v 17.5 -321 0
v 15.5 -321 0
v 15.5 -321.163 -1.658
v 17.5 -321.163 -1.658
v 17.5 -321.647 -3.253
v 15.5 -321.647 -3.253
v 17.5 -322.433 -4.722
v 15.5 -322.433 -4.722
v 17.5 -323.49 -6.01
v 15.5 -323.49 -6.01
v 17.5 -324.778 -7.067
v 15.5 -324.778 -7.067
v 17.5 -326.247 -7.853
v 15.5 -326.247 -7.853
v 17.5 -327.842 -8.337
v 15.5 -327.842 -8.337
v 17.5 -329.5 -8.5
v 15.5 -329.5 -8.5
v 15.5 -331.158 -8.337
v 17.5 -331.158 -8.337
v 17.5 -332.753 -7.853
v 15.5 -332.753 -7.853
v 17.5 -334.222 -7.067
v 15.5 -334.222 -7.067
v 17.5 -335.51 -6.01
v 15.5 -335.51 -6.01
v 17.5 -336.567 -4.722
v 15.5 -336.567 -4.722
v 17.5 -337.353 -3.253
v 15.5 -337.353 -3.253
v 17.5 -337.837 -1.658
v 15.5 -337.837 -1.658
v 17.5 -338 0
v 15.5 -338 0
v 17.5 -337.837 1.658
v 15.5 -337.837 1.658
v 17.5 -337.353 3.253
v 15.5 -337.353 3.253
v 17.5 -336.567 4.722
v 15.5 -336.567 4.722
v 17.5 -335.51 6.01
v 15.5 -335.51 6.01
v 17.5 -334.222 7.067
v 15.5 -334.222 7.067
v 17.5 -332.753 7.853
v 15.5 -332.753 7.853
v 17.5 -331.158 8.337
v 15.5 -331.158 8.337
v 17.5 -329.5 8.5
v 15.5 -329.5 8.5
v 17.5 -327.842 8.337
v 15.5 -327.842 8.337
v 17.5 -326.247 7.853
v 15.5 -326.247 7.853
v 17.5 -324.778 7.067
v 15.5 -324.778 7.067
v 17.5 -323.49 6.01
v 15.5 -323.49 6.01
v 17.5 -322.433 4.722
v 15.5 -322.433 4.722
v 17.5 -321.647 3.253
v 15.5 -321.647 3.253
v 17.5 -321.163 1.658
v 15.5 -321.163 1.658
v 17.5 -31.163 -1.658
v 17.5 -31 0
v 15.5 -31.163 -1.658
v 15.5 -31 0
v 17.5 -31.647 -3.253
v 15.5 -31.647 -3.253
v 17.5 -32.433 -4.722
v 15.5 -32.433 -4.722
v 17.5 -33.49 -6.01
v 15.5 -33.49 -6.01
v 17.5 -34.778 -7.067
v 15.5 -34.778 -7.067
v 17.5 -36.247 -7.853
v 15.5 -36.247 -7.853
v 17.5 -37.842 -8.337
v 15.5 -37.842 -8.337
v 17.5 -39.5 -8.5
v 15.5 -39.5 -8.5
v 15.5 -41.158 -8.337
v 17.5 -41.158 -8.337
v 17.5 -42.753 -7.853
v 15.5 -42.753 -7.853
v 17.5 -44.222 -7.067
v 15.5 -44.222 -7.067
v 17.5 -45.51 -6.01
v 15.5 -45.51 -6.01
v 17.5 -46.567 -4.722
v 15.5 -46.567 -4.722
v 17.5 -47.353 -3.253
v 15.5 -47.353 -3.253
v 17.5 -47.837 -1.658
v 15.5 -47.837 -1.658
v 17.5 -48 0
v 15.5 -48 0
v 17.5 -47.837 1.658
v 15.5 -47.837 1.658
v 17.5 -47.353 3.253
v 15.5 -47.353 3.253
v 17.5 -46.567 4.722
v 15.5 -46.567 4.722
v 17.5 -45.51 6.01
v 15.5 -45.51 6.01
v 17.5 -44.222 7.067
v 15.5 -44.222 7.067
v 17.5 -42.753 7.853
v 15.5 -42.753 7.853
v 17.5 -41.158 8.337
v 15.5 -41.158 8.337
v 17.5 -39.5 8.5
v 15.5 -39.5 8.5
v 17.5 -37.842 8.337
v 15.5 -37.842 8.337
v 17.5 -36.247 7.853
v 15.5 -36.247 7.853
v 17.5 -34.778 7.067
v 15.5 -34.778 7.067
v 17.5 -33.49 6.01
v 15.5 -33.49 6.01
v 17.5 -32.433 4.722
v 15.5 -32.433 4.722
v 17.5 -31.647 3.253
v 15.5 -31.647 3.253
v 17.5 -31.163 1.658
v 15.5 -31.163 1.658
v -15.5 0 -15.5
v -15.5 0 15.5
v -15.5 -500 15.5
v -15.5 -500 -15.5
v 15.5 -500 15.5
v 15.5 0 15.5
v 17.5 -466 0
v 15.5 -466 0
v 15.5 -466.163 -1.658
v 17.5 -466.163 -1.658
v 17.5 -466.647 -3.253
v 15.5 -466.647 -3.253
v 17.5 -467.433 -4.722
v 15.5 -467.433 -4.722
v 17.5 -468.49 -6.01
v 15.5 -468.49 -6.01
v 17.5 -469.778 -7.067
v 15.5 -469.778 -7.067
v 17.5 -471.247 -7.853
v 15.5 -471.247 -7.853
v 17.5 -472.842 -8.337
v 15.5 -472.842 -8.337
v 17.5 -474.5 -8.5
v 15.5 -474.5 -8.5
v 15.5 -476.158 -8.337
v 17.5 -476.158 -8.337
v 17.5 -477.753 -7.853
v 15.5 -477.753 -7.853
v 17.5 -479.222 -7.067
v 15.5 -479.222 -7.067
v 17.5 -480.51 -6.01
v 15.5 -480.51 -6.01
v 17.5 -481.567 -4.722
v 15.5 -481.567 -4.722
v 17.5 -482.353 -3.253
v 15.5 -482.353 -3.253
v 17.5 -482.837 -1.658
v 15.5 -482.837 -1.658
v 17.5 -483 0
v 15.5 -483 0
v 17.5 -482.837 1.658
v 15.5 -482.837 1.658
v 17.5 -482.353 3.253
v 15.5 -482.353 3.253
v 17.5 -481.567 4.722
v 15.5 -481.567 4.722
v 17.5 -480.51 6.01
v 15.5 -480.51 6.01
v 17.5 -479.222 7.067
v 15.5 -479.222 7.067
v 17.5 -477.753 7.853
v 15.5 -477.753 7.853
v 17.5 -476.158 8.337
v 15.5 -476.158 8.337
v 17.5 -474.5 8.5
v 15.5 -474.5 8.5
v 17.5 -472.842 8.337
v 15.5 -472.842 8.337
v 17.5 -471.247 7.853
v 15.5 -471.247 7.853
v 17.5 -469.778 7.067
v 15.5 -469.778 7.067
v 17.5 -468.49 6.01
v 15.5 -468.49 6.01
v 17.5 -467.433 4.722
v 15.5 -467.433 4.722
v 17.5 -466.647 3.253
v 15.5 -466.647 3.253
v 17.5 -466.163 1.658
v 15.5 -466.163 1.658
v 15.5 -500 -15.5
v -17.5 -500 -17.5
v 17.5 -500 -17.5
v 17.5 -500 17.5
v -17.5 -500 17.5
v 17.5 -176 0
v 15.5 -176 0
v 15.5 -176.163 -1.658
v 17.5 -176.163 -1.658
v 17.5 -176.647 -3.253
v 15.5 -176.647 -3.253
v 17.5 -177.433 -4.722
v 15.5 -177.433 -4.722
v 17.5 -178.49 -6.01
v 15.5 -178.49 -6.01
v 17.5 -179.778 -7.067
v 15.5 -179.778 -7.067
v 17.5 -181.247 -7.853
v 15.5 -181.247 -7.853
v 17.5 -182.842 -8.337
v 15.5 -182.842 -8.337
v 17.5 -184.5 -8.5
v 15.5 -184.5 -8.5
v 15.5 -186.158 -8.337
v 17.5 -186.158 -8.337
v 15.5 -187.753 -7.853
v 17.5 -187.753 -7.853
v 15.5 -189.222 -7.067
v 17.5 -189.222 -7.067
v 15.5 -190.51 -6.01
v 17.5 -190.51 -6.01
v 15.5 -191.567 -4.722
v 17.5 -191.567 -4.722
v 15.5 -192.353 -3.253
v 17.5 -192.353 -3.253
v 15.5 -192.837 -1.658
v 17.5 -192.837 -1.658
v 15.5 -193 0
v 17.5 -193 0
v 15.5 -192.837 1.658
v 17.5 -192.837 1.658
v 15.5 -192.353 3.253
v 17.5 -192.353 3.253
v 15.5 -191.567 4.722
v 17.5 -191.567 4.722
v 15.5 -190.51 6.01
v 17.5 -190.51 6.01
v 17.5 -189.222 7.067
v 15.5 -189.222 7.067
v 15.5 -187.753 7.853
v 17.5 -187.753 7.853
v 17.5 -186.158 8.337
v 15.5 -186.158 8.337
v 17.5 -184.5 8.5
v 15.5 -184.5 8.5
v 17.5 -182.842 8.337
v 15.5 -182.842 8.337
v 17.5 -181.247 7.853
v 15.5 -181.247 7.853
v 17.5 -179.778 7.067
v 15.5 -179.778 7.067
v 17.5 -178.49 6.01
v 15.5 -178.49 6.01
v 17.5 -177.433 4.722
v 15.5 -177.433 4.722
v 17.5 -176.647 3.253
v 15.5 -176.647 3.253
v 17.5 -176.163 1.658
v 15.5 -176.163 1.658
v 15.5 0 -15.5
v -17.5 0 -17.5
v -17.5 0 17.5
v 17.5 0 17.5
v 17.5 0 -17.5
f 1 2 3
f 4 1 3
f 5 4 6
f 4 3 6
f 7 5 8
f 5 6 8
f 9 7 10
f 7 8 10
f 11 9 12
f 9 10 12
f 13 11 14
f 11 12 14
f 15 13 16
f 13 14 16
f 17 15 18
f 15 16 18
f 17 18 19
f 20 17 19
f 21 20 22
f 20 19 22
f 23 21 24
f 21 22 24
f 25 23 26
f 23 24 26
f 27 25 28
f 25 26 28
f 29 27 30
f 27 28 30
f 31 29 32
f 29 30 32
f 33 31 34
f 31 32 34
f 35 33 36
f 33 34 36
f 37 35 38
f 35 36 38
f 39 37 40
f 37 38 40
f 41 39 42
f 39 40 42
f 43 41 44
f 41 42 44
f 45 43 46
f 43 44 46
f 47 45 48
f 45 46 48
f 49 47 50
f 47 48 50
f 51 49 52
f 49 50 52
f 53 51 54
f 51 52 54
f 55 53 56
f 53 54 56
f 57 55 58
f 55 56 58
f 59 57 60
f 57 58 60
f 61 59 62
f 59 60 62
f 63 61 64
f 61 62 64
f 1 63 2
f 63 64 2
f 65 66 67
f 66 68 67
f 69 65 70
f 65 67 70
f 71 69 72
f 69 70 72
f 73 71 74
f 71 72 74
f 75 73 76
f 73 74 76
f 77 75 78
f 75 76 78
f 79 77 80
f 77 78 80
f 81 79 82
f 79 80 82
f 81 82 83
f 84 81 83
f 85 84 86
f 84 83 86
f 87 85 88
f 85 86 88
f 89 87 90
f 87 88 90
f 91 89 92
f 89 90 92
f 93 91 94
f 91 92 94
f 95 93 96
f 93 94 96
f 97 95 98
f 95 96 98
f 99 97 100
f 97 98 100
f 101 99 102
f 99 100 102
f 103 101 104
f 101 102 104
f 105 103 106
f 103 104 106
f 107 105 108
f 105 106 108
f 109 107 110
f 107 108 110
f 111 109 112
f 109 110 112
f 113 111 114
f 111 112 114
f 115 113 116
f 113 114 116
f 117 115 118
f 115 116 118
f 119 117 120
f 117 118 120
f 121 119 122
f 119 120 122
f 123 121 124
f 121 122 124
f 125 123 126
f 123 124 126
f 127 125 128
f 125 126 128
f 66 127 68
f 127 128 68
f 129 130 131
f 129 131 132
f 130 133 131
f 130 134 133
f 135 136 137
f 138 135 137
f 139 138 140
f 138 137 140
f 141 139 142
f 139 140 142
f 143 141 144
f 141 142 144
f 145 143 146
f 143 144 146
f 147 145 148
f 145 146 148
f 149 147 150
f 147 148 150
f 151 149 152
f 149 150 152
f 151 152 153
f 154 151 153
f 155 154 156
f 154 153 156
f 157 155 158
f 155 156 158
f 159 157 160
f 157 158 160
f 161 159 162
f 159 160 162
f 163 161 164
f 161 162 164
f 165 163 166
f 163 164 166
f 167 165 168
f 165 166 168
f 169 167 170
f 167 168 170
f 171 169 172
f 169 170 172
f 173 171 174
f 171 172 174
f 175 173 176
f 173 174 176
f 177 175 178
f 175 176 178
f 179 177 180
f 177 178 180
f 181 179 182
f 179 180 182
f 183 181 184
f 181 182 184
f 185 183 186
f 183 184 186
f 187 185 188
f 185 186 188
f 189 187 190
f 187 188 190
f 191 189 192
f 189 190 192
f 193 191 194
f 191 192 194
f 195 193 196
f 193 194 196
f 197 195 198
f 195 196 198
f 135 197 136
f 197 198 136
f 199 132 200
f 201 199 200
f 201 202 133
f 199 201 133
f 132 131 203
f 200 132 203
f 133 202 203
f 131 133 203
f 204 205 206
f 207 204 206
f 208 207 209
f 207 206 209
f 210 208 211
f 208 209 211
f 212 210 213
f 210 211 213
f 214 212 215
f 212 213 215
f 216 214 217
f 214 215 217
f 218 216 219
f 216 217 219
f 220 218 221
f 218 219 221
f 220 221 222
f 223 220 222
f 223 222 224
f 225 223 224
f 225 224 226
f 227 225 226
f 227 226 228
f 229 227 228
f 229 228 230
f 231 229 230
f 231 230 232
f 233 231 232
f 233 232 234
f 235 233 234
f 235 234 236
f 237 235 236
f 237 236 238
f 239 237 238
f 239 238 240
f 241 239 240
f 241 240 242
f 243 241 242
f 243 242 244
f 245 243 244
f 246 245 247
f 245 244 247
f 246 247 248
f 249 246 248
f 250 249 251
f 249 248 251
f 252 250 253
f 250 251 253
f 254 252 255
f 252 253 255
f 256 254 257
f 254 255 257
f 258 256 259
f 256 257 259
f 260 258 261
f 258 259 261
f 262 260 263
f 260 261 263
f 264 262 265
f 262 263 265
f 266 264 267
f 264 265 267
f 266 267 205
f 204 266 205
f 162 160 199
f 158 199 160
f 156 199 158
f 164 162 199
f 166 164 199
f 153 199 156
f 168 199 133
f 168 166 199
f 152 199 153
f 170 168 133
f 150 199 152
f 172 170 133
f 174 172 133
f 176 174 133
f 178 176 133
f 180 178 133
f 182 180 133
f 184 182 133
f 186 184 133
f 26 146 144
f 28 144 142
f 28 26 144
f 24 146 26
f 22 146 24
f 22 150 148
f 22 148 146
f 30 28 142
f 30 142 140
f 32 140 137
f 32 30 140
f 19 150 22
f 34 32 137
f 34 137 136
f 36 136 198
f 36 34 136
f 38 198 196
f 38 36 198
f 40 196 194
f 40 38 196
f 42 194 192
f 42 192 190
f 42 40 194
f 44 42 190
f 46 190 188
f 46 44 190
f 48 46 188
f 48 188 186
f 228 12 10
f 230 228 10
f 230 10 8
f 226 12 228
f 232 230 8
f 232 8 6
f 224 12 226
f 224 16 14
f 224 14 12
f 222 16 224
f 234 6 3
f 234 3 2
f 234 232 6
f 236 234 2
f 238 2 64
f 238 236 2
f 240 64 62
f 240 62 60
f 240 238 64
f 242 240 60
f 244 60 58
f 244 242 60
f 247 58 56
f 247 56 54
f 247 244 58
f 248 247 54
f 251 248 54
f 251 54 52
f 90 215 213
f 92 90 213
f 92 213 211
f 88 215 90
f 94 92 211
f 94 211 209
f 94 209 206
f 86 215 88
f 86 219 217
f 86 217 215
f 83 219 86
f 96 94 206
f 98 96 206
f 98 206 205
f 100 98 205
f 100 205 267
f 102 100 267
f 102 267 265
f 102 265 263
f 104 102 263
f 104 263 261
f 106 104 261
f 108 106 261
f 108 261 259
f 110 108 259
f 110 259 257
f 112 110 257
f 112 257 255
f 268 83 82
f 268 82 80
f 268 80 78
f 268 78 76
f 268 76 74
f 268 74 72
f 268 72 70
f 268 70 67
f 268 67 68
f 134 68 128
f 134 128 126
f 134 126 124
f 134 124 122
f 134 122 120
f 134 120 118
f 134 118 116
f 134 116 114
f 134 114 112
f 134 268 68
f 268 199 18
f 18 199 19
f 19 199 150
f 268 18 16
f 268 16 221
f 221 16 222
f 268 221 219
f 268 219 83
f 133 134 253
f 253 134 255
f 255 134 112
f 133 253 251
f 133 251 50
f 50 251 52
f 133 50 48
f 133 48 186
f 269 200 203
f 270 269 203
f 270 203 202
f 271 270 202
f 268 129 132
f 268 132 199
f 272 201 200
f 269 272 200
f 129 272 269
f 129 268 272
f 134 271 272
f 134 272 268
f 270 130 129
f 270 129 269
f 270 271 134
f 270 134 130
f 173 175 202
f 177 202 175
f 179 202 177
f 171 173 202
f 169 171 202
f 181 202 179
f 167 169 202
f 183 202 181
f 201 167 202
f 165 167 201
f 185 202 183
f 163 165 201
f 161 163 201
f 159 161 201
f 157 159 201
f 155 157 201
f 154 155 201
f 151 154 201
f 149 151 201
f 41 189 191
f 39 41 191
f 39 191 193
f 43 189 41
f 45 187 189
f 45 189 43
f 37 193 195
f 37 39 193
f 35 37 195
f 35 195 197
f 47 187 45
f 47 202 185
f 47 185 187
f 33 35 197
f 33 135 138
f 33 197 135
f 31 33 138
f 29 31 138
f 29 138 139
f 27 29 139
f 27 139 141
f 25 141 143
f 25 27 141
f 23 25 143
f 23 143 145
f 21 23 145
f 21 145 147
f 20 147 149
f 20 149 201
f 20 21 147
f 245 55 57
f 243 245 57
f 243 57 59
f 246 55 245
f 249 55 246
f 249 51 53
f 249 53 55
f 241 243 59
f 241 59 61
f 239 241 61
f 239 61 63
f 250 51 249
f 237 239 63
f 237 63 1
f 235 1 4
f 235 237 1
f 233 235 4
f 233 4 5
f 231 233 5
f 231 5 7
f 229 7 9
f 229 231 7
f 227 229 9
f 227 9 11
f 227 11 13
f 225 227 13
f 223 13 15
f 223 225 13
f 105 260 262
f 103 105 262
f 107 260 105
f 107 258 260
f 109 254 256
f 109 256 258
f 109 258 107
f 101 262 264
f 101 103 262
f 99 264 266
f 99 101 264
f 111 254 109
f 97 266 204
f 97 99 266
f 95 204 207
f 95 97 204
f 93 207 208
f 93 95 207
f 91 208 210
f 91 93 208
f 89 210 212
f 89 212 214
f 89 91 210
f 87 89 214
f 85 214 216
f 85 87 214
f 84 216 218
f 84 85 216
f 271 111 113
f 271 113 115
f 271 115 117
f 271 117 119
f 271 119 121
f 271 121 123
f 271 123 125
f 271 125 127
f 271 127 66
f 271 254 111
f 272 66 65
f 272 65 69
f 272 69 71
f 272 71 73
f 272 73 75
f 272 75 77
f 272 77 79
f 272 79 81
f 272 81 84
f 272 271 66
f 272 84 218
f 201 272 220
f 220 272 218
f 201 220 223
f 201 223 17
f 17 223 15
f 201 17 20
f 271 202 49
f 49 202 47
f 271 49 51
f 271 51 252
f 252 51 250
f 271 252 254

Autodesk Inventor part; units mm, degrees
ref_plane "YZ Plane" through (0, 0, 0) normal (1, 0, 0) x (0, 1, 0)
ref_plane "XZ Plane" through (0, 0, 0) normal (0, 1, 0) x (-1, 0, 0)
ref_plane "XY Plane" through (0, 0, 0) normal (0, 0, 1) x (1, 0, 0)
sketch "Sketch9" plane through (0, 0, 0) normal (0, 1, 0) x (-1, 0, 0)
  line L0 (17.5, 17.5) -> (-17.5, 17.5)
  line L1 (-17.5, 17.5) -> (-17.5, -17.5)
  line L2 (-17.5, -17.5) -> (17.5, -17.5)
  line L3 (17.5, -17.5) -> (17.5, 17.5)
  line L4 (17.5, 17.5) -> (-17.5, -17.5) construction
  line L5 (-17.5, 17.5) -> (17.5, -17.5) construction
  line L6 (-15.5, 15.5) -> (15.5, 15.5)
  line L7 (15.5, 15.5) -> (15.5, -15.5)
  line L8 (15.5, -15.5) -> (-15.5, -15.5)
  line L9 (-15.5, -15.5) -> (-15.5, 15.5)
  point P0 (0, 0)
  dimension "d172" = 35
  dimension "d173" = 35
  dimension "d174" = 2
extrude "Extrusion3" add sketch "Sketch9" against normal blind 500
sketch "Sketch10" plane through (0, 0, 0) normal (1, 0, 0) x (0, 1, 0)
  line L0 (0, 17.5) -> (0, -17.5) construction
  line L1 (0, 17.5) -> (-500, 17.5) construction
  line L2 (-500, -17.5) -> (-500, 17.5) construction
  line L3 (0, -17.5) -> (-500, -17.5) construction
  line L4 (-483, 8.5) -> (-466, 8.5)
  line L5 (-466, 8.5) -> (-466, -8.5)
  line L6 (-466, -8.5) -> (-483, -8.5)
  line L7 (-483, -8.5) -> (-483, 8.5)
  line L8 (-483, 8.5) -> (-466, -8.5) construction
  line L9 (-466, 8.5) -> (-483, -8.5) construction
  circle A0 centre (-474.5, 0) radius 8.5
  line L10 (0, 17.5) -> (0, -17.5) projected
  point P0 (0, 0)
  point P1 (0, 0)
  point P2 (-500, 0)
  dimension "d177" = 17
  dimension "d178" = 17
  dimension "d191" = 17
extrude "Extrusion4" cut sketch "Sketch10" along normal through all contours A0
pattern_linear "Rectangular Pattern4" count 4 spacing 145 along (0, 1, 0) of "Extrusion4"
properties part number "ANP 1435 FDS WAY tube5" material "Stainless Steel"
